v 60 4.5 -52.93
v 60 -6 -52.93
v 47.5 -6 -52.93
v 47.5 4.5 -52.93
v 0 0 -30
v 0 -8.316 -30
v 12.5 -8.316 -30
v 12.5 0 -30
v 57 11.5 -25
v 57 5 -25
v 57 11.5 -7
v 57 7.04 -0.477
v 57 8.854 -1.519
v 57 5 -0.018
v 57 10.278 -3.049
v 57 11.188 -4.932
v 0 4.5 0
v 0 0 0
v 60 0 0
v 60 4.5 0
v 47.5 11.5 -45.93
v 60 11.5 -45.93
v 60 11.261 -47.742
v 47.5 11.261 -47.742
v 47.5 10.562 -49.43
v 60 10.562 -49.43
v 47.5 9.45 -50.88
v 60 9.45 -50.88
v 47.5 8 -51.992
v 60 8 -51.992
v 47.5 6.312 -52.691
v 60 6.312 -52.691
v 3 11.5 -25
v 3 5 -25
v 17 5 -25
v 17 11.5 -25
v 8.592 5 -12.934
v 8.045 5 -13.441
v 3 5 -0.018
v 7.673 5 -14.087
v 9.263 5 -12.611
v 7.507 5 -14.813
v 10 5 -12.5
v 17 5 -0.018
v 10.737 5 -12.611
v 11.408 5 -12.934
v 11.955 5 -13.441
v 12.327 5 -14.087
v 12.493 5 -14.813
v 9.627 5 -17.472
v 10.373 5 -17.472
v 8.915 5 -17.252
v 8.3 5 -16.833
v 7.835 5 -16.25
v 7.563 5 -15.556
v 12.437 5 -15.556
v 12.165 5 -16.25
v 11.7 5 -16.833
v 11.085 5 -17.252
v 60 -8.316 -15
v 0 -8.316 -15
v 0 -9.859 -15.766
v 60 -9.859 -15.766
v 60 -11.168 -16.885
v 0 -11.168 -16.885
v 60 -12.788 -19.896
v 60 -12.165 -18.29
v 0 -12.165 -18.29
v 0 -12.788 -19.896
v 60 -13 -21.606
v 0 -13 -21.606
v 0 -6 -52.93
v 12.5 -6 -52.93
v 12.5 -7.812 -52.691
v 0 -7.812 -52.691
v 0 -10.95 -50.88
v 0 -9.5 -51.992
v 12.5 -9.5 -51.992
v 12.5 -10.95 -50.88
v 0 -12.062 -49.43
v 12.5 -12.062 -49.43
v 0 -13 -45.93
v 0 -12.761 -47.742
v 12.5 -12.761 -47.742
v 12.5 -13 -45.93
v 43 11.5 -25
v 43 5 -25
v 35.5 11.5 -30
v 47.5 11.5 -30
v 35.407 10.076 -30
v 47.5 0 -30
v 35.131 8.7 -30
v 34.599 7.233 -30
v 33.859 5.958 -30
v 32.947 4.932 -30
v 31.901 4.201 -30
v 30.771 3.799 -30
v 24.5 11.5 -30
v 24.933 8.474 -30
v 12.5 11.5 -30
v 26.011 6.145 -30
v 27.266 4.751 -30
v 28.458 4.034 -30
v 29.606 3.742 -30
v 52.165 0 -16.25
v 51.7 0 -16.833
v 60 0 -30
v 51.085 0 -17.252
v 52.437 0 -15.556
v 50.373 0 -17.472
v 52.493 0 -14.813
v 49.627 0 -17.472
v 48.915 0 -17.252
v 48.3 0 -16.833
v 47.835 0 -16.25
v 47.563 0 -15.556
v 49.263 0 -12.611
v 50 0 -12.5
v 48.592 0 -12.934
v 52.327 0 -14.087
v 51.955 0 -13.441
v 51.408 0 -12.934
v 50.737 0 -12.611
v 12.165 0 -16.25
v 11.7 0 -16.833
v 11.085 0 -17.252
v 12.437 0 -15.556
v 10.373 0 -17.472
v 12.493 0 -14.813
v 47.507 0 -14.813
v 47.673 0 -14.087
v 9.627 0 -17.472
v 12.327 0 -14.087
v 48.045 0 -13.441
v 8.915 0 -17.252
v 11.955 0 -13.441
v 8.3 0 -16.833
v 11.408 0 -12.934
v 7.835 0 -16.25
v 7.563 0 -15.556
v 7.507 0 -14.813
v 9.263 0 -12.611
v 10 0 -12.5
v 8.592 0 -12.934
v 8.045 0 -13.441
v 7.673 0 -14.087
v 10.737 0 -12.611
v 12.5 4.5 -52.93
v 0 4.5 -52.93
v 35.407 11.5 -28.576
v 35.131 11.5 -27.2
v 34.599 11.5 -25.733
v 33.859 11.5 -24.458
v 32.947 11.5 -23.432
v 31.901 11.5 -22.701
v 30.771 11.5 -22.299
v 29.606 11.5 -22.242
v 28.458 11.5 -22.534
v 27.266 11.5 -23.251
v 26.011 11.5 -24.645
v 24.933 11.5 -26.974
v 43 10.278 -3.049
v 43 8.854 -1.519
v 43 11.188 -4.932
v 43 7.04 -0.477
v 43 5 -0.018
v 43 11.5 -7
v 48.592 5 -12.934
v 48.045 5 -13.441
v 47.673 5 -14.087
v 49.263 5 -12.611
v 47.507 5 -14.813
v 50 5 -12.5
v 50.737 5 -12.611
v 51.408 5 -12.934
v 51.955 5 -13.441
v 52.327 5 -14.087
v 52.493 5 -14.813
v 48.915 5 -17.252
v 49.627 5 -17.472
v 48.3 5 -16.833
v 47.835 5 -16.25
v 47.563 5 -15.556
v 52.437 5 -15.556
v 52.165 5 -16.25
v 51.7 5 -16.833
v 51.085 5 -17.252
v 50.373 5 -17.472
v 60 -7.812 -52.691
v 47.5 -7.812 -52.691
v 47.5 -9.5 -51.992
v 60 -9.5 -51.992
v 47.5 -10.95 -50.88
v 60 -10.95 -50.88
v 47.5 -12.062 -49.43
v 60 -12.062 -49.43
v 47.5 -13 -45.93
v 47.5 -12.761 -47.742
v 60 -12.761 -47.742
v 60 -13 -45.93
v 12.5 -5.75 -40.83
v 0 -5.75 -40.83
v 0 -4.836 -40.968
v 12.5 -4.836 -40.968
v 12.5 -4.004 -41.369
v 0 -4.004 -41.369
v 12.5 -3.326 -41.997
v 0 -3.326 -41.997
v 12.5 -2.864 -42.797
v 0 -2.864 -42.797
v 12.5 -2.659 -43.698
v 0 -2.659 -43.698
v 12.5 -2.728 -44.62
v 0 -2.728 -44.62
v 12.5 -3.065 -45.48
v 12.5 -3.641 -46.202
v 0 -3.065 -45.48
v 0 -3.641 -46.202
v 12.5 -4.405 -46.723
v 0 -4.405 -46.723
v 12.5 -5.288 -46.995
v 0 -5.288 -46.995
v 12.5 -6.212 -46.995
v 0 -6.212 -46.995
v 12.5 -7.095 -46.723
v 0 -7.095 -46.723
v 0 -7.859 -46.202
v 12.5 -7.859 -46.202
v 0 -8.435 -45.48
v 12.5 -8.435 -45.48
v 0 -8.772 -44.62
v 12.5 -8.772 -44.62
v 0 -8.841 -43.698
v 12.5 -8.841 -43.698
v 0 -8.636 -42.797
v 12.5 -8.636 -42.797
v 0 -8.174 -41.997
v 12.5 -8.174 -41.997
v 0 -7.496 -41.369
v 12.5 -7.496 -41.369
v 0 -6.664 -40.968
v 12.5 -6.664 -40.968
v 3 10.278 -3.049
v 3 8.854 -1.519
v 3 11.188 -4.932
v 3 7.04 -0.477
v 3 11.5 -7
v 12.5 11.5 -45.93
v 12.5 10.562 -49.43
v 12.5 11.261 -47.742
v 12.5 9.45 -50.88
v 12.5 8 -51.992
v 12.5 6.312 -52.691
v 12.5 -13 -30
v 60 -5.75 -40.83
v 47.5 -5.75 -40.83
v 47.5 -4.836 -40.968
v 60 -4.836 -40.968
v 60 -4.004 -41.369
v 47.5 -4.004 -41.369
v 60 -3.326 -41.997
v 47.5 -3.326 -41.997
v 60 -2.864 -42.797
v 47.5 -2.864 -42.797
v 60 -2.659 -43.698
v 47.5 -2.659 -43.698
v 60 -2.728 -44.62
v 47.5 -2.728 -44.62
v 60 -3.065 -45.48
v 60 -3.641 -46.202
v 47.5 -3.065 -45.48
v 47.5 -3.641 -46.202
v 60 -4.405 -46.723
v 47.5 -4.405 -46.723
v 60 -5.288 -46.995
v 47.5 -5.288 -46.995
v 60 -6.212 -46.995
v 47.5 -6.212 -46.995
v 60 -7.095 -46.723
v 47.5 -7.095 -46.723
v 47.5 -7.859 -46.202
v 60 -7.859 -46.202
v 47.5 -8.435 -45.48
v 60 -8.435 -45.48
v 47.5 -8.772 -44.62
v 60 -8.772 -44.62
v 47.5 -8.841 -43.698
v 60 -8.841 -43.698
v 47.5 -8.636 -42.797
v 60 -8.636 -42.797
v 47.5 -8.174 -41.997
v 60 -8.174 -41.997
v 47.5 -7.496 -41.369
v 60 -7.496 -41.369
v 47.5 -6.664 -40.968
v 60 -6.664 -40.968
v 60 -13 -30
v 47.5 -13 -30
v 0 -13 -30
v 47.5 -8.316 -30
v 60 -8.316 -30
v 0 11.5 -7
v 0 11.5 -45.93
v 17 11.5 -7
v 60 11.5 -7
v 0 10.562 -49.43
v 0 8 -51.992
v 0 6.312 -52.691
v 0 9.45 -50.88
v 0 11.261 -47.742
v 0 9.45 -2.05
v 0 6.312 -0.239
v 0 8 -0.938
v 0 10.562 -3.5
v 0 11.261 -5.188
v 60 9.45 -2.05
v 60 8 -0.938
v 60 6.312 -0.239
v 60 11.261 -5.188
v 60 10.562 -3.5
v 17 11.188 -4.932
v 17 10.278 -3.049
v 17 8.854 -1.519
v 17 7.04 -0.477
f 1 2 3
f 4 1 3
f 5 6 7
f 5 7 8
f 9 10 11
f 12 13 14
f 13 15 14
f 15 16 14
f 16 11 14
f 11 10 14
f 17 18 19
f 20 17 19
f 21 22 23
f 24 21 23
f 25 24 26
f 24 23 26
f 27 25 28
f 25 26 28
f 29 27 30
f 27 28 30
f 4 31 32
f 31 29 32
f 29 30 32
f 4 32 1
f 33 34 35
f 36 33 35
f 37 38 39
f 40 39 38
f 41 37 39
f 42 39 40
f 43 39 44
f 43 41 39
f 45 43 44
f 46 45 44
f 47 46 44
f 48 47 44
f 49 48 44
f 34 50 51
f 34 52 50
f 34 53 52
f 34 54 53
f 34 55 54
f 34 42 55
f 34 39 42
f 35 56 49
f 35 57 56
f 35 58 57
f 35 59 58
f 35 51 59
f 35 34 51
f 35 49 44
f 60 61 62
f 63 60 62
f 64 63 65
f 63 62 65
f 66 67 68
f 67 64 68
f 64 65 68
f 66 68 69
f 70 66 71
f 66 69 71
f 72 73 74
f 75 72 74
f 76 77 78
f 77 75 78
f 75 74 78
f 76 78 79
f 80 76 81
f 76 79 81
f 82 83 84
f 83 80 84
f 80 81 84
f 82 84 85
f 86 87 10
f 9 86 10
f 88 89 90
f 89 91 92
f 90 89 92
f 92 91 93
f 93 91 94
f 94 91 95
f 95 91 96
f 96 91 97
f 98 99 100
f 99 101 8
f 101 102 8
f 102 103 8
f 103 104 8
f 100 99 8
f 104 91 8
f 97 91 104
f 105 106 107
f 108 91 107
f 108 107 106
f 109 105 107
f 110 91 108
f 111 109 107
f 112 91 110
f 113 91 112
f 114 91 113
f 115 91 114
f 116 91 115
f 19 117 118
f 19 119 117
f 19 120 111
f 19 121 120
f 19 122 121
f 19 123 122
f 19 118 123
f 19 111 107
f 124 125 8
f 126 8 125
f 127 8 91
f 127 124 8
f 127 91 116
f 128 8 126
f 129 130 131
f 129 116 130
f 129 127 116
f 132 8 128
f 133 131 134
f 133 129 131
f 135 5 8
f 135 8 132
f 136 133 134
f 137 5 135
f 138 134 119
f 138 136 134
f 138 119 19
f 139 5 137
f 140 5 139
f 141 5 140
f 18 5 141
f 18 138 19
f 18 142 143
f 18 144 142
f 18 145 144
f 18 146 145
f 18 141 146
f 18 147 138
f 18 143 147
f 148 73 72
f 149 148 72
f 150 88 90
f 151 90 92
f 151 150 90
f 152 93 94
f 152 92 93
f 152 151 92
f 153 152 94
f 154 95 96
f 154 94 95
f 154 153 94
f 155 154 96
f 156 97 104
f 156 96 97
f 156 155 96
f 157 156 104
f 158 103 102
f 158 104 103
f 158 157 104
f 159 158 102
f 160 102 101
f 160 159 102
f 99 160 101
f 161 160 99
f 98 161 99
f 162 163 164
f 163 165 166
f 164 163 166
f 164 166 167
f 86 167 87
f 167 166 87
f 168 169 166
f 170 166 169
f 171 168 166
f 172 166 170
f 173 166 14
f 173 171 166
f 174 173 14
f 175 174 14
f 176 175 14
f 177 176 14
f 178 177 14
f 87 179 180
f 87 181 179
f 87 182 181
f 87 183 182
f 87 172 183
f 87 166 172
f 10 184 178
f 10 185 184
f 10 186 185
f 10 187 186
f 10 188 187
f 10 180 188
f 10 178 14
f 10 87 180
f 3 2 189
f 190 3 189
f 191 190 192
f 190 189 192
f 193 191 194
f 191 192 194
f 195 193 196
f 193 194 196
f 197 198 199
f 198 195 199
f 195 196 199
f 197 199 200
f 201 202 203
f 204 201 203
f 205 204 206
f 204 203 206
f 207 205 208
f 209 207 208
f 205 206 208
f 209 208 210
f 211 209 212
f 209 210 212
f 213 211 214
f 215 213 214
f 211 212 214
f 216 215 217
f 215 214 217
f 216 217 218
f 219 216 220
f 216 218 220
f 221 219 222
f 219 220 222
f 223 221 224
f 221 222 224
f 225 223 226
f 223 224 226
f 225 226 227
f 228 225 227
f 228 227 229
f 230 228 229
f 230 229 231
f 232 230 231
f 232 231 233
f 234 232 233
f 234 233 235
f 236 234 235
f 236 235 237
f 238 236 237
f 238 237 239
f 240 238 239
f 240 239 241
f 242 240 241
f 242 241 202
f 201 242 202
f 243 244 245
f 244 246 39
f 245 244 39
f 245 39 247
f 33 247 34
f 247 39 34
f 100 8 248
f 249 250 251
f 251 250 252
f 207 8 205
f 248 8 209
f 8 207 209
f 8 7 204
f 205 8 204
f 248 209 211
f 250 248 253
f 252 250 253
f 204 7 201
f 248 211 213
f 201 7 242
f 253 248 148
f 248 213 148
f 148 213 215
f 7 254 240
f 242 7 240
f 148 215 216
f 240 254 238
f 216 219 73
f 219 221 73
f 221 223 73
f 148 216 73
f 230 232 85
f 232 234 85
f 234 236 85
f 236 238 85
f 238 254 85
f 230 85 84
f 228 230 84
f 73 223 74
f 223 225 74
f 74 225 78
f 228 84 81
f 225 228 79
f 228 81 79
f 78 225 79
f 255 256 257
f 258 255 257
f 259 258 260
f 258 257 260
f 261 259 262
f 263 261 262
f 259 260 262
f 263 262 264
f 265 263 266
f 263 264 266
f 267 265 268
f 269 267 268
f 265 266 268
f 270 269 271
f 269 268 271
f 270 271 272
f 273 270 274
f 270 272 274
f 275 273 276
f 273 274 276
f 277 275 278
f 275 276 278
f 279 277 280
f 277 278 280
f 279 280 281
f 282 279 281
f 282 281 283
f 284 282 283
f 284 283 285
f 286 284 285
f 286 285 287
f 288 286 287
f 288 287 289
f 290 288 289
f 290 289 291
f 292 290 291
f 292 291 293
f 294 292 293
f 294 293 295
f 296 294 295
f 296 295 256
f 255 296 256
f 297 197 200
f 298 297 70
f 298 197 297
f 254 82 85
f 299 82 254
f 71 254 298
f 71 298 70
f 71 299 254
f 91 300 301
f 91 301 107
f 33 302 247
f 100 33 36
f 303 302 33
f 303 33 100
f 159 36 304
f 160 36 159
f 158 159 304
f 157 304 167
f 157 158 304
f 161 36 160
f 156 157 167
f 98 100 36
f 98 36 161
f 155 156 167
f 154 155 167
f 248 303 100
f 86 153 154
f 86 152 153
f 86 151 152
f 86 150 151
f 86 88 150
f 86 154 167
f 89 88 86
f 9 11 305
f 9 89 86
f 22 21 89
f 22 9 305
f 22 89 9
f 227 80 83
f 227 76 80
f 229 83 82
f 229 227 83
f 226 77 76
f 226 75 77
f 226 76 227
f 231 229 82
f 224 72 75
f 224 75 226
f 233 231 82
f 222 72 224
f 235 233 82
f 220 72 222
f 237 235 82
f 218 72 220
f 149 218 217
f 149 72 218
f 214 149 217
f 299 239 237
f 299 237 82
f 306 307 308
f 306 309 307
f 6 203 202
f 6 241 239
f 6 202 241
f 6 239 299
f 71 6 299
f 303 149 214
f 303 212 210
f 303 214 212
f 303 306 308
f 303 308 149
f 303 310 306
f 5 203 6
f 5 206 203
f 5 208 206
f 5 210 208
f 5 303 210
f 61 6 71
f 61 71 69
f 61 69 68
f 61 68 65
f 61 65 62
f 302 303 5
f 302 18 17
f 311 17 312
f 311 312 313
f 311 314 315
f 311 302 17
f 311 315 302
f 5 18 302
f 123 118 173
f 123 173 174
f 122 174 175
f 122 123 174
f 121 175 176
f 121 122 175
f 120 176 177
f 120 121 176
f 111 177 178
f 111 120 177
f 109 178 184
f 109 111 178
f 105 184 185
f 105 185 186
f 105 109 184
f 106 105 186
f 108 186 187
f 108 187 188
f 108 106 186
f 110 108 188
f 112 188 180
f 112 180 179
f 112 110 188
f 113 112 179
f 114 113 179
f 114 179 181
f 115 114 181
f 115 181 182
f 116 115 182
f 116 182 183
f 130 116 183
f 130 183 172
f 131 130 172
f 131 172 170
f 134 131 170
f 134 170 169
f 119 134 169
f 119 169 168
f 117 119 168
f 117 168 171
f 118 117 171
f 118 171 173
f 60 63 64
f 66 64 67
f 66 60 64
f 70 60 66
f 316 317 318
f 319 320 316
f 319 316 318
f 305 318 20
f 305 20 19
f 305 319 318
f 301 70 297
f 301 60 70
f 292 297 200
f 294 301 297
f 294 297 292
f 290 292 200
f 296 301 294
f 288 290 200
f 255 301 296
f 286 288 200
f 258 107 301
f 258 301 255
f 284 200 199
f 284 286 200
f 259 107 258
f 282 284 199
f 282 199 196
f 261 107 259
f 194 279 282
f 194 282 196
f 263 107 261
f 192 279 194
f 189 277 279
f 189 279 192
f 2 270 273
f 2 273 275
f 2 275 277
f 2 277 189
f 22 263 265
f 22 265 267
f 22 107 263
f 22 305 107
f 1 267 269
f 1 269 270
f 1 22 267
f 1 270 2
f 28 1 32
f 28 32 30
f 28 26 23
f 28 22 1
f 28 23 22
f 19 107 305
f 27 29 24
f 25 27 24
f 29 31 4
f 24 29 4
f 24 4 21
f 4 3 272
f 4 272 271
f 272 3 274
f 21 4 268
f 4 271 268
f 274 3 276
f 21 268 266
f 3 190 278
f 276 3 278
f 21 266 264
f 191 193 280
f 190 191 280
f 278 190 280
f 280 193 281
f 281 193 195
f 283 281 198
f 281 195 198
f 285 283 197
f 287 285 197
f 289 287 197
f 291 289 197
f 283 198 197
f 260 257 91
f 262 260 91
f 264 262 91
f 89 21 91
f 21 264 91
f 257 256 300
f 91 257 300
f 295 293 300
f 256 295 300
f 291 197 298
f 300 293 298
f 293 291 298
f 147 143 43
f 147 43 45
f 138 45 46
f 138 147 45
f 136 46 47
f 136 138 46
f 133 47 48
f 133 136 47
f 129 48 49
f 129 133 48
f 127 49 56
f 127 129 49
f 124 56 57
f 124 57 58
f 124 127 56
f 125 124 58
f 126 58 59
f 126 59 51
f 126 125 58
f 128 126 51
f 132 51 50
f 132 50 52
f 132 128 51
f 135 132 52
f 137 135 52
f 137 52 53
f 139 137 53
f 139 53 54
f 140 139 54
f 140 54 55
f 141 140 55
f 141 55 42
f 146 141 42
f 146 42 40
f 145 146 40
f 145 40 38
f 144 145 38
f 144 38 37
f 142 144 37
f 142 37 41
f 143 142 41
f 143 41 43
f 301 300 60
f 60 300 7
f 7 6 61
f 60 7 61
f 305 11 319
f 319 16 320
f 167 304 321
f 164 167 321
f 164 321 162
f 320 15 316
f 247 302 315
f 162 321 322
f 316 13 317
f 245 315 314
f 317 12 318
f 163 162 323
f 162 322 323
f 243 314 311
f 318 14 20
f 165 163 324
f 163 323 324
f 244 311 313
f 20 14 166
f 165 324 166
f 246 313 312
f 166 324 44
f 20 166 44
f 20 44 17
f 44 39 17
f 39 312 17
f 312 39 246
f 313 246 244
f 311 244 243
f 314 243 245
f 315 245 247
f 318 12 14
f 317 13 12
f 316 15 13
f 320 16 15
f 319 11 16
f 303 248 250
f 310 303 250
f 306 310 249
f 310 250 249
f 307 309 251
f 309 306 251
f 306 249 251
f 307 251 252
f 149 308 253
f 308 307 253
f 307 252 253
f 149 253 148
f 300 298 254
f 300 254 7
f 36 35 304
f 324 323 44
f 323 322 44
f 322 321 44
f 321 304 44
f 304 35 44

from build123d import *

# Parameters (mm, degrees)
SALIENTE_EXTRUIR1_DEPTH      = 5
SALIENTE_EXTRUIR1_DEPTH_BACK = 13
CROQUIS1_R                   = 2.5
SALIENTE_EXTRUIR2_DEPTH      = 6.5
SALIENTE_EXTRUIR2_DEPTH_BACK = 10
CORTAR_EXTRUIR2_REACH        = 83.059
CROQUIS4_R                   = 3.1
CROQUIS4_W                   = 30
CROQUIS4_H                   = 13
CORTAR_EXTRUIR3_DEPTH        = 10
CORTAR_EXTRUIR3_DEPTH_BACK   = 10
CROQUIS5_R                   = 5.5
SALIENTE_EXTRUIR3_REACH      = 83.059
CROQUIS6_W                   = 15
CROQUIS6_H                   = 4.684186211
REDONDEO1_R                  = 7


with BuildPart() as part:
    # Croquis1 → Saliente-Extruir1 (new, two sides: drawn at the far end of the back side and taken through both)
    with BuildSketch(Plane(origin=(0, 0, 0), x_dir=(1, 0, 0), z_dir=(0, 1, 0)).offset(-SALIENTE_EXTRUIR1_DEPTH_BACK)):
        Polygon((0, 0), (60, 0), (60, 30), (60, 52.93), (47.5, 52.93), (47.5, 30), (12.5, 30), (12.5, 52.93), (0, 52.93), (0, 30), align=None)
        with Locations(Location((10, 15, 0), (0, 0, 270))):
            Circle(CROQUIS1_R, mode=Mode.SUBTRACT)
        with Locations(Location((50, 15, 0), (0, 0, 270))):
            Circle(CROQUIS1_R, mode=Mode.SUBTRACT)
    extrude(amount=SALIENTE_EXTRUIR1_DEPTH + SALIENTE_EXTRUIR1_DEPTH_BACK)

    # Croquis2 → Saliente-Extruir2 (add, two sides: drawn at the far end of the back side and taken through both)
    with BuildSketch(Plane(origin=(0, 5, 0), x_dir=(1, 0, 0), z_dir=(0, 1, 0)).offset(-SALIENTE_EXTRUIR2_DEPTH_BACK)):
        Polygon((3, 0), (3, 25), (17, 25), (17, 0), (43, 0), (43, 25), (57, 25), (57, 0), (60, 0), (60, 52.93), (47.5, 52.93), (47.5, 30), (12.5, 30), (12.5, 52.93), (0, 52.93), (0, 0), align=None)
    extrude(amount=SALIENTE_EXTRUIR2_DEPTH + SALIENTE_EXTRUIR2_DEPTH_BACK)

    # Cortar-Extruir2: up to this face of the body (flat: up to its plane)
    cortar_extruir2_end = Plane(part.part.faces().sort_by_distance((60, -0.75, -26.465))[0])
    # Croquis4 → Cortar-Extruir2 (cut, up to the picked face)
    with BuildSketch(Plane.ZY, mode=Mode.PRIVATE) as cortar_extruir2_sk1:
        with Locations((-43.93, -5.75)):
            Circle(CROQUIS4_R)
    cortar_extruir2_tool1 = split(extrude(cortar_extruir2_sk1.sketch, amount=-CORTAR_EXTRUIR2_REACH, mode=Mode.PRIVATE), bisect_by=cortar_extruir2_end, keep=Keep.BOTH, mode=Mode.PRIVATE)
    # Croquis4 → Cortar-Extruir2 (cut, up to the picked face)
    with BuildSketch(Plane.ZY, mode=Mode.PRIVATE) as cortar_extruir2_sk2:
        with Locations((-15, -6.5)):
            Rectangle(CROQUIS4_W, CROQUIS4_H)
    cortar_extruir2_tool2 = split(extrude(cortar_extruir2_sk2.sketch, amount=-CORTAR_EXTRUIR2_REACH, mode=Mode.PRIVATE), bisect_by=cortar_extruir2_end, keep=Keep.BOTH, mode=Mode.PRIVATE)
    add(cortar_extruir2_tool1.solids().sort_by(Axis((0, -5.75, -43.93), (1, 0, 0)))[0], mode=Mode.SUBTRACT)
    add(cortar_extruir2_tool2.solids().sort_by(Axis((0, -6.5, -15), (1, 0, 0)))[0], mode=Mode.SUBTRACT)

    # Croquis5 → Cortar-Extruir3 (cut, two sides: drawn at the far end of the back side and taken through both)
    with BuildSketch(Plane(origin=(0, -9.25, -9.25), x_dir=(-1, 0, 0), z_dir=(0, -0.7071067811865488, -0.7071067811865464)).offset(-CORTAR_EXTRUIR3_DEPTH_BACK)):
        with Locations((-30, 29.344931419)):
            Circle(CROQUIS5_R)
    extrude(amount=CORTAR_EXTRUIR3_DEPTH + CORTAR_EXTRUIR3_DEPTH_BACK, mode=Mode.SUBTRACT)

    # Saliente-Extruir3: up to this face of the body (flat: up to its plane)
    saliente_extruir3_end = Plane(part.part.faces().sort_by_distance((60, 1.98040053, -30.964309834))[0])
    # Croquis6 → Saliente-Extruir3 (add, up to the picked face)
    with BuildSketch(Plane.ZY, mode=Mode.PRIVATE) as saliente_extruir3_sk1:
        with Locations((-22.5, -10.657906894)):
            Rectangle(CROQUIS6_W, CROQUIS6_H)
    saliente_extruir3_tool1 = split(extrude(saliente_extruir3_sk1.sketch, amount=-SALIENTE_EXTRUIR3_REACH, mode=Mode.PRIVATE), bisect_by=saliente_extruir3_end, keep=Keep.BOTH, mode=Mode.PRIVATE)
    add(saliente_extruir3_tool1.solids().sort_by(Axis((0, -10.657907, -22.5), (1, 0, 0)))[0])

    # Redondeo1
    # the kernel refuses this fillet: 7 mm, written as the material it takes off along each edge
    with BuildSketch(Plane(origin=(-16.514578123, -13, -15), x_dir=(0, 0, -1), z_dir=(1, 0, 0))) as redondeo1_piece_1:
        with BuildLine():
            CenterArc((6.605831249, 7), REDONDEO1_R, 199.319193713, 70.680806287)
            Line((0, 4.684186211), (0, 0))
            Line((0, 0), (6.605831249, 0))
        make_face()
    extrude(amount=93.029156246, mode=Mode.SUBTRACT)
    with BuildSketch(Plane(origin=(77.5, -13, -52.93), x_dir=(0, 1, 0), z_dir=(-1, 0, 0)), Plane(origin=(30, 11.5, -52.93), x_dir=(0, 0, 1), z_dir=(-1, 0, 0)), Plane(origin=(77.5, 11.5, -52.93), x_dir=(0, 0, 1), z_dir=(-1, 0, 0))) as redondeo1_piece_2:
        with BuildLine():
            CenterArc((REDONDEO1_R, -REDONDEO1_R), REDONDEO1_R, 90, 90)
            Line((0, -REDONDEO1_R), (0, 0))
            Line((0, 0), (REDONDEO1_R, 0))
        make_face()
    extrude(amount=47.5, mode=Mode.SUBTRACT)
    with BuildSketch(Plane(origin=(30, -13, -52.93), x_dir=(0, 0, 1), z_dir=(-1, 0, 0))) as redondeo1_piece_3:
        with BuildLine():
            CenterArc((REDONDEO1_R, REDONDEO1_R), REDONDEO1_R, 180, 90)
            Line((0, REDONDEO1_R), (0, 0))
            Line((0, 0), (REDONDEO1_R, 0))
        make_face()
    extrude(amount=47.5, mode=Mode.SUBTRACT)
    with BuildSketch(Plane(origin=(-17.5, 11.5, 0), x_dir=(0, -1, 0), z_dir=(1, 0, 0)), Plane(origin=(39.5, 11.5, 0), x_dir=(0, -1, 0), z_dir=(1, 0, 0))) as redondeo1_piece_4:
        with BuildLine():
            CenterArc((REDONDEO1_R, REDONDEO1_R), REDONDEO1_R, 180, 90)
            Line((0, REDONDEO1_R), (0, 0))
            Line((0, 0), (REDONDEO1_R, 0))
        make_face()
    extrude(amount=38, mode=Mode.SUBTRACT)
    with BuildSketch(Plane(origin=(-0.5, 11.5, 0), x_dir=(0, -1, 0), z_dir=(1, 0, 0))) as redondeo1_piece_5:
        with BuildLine():
            CenterArc((REDONDEO1_R, REDONDEO1_R), REDONDEO1_R, 180, 90)
            Line((0, REDONDEO1_R), (0, 0))
            Line((0, 0), (REDONDEO1_R, 0))
        make_face()
    extrude(amount=61, mode=Mode.SUBTRACT)


solid = part.part
